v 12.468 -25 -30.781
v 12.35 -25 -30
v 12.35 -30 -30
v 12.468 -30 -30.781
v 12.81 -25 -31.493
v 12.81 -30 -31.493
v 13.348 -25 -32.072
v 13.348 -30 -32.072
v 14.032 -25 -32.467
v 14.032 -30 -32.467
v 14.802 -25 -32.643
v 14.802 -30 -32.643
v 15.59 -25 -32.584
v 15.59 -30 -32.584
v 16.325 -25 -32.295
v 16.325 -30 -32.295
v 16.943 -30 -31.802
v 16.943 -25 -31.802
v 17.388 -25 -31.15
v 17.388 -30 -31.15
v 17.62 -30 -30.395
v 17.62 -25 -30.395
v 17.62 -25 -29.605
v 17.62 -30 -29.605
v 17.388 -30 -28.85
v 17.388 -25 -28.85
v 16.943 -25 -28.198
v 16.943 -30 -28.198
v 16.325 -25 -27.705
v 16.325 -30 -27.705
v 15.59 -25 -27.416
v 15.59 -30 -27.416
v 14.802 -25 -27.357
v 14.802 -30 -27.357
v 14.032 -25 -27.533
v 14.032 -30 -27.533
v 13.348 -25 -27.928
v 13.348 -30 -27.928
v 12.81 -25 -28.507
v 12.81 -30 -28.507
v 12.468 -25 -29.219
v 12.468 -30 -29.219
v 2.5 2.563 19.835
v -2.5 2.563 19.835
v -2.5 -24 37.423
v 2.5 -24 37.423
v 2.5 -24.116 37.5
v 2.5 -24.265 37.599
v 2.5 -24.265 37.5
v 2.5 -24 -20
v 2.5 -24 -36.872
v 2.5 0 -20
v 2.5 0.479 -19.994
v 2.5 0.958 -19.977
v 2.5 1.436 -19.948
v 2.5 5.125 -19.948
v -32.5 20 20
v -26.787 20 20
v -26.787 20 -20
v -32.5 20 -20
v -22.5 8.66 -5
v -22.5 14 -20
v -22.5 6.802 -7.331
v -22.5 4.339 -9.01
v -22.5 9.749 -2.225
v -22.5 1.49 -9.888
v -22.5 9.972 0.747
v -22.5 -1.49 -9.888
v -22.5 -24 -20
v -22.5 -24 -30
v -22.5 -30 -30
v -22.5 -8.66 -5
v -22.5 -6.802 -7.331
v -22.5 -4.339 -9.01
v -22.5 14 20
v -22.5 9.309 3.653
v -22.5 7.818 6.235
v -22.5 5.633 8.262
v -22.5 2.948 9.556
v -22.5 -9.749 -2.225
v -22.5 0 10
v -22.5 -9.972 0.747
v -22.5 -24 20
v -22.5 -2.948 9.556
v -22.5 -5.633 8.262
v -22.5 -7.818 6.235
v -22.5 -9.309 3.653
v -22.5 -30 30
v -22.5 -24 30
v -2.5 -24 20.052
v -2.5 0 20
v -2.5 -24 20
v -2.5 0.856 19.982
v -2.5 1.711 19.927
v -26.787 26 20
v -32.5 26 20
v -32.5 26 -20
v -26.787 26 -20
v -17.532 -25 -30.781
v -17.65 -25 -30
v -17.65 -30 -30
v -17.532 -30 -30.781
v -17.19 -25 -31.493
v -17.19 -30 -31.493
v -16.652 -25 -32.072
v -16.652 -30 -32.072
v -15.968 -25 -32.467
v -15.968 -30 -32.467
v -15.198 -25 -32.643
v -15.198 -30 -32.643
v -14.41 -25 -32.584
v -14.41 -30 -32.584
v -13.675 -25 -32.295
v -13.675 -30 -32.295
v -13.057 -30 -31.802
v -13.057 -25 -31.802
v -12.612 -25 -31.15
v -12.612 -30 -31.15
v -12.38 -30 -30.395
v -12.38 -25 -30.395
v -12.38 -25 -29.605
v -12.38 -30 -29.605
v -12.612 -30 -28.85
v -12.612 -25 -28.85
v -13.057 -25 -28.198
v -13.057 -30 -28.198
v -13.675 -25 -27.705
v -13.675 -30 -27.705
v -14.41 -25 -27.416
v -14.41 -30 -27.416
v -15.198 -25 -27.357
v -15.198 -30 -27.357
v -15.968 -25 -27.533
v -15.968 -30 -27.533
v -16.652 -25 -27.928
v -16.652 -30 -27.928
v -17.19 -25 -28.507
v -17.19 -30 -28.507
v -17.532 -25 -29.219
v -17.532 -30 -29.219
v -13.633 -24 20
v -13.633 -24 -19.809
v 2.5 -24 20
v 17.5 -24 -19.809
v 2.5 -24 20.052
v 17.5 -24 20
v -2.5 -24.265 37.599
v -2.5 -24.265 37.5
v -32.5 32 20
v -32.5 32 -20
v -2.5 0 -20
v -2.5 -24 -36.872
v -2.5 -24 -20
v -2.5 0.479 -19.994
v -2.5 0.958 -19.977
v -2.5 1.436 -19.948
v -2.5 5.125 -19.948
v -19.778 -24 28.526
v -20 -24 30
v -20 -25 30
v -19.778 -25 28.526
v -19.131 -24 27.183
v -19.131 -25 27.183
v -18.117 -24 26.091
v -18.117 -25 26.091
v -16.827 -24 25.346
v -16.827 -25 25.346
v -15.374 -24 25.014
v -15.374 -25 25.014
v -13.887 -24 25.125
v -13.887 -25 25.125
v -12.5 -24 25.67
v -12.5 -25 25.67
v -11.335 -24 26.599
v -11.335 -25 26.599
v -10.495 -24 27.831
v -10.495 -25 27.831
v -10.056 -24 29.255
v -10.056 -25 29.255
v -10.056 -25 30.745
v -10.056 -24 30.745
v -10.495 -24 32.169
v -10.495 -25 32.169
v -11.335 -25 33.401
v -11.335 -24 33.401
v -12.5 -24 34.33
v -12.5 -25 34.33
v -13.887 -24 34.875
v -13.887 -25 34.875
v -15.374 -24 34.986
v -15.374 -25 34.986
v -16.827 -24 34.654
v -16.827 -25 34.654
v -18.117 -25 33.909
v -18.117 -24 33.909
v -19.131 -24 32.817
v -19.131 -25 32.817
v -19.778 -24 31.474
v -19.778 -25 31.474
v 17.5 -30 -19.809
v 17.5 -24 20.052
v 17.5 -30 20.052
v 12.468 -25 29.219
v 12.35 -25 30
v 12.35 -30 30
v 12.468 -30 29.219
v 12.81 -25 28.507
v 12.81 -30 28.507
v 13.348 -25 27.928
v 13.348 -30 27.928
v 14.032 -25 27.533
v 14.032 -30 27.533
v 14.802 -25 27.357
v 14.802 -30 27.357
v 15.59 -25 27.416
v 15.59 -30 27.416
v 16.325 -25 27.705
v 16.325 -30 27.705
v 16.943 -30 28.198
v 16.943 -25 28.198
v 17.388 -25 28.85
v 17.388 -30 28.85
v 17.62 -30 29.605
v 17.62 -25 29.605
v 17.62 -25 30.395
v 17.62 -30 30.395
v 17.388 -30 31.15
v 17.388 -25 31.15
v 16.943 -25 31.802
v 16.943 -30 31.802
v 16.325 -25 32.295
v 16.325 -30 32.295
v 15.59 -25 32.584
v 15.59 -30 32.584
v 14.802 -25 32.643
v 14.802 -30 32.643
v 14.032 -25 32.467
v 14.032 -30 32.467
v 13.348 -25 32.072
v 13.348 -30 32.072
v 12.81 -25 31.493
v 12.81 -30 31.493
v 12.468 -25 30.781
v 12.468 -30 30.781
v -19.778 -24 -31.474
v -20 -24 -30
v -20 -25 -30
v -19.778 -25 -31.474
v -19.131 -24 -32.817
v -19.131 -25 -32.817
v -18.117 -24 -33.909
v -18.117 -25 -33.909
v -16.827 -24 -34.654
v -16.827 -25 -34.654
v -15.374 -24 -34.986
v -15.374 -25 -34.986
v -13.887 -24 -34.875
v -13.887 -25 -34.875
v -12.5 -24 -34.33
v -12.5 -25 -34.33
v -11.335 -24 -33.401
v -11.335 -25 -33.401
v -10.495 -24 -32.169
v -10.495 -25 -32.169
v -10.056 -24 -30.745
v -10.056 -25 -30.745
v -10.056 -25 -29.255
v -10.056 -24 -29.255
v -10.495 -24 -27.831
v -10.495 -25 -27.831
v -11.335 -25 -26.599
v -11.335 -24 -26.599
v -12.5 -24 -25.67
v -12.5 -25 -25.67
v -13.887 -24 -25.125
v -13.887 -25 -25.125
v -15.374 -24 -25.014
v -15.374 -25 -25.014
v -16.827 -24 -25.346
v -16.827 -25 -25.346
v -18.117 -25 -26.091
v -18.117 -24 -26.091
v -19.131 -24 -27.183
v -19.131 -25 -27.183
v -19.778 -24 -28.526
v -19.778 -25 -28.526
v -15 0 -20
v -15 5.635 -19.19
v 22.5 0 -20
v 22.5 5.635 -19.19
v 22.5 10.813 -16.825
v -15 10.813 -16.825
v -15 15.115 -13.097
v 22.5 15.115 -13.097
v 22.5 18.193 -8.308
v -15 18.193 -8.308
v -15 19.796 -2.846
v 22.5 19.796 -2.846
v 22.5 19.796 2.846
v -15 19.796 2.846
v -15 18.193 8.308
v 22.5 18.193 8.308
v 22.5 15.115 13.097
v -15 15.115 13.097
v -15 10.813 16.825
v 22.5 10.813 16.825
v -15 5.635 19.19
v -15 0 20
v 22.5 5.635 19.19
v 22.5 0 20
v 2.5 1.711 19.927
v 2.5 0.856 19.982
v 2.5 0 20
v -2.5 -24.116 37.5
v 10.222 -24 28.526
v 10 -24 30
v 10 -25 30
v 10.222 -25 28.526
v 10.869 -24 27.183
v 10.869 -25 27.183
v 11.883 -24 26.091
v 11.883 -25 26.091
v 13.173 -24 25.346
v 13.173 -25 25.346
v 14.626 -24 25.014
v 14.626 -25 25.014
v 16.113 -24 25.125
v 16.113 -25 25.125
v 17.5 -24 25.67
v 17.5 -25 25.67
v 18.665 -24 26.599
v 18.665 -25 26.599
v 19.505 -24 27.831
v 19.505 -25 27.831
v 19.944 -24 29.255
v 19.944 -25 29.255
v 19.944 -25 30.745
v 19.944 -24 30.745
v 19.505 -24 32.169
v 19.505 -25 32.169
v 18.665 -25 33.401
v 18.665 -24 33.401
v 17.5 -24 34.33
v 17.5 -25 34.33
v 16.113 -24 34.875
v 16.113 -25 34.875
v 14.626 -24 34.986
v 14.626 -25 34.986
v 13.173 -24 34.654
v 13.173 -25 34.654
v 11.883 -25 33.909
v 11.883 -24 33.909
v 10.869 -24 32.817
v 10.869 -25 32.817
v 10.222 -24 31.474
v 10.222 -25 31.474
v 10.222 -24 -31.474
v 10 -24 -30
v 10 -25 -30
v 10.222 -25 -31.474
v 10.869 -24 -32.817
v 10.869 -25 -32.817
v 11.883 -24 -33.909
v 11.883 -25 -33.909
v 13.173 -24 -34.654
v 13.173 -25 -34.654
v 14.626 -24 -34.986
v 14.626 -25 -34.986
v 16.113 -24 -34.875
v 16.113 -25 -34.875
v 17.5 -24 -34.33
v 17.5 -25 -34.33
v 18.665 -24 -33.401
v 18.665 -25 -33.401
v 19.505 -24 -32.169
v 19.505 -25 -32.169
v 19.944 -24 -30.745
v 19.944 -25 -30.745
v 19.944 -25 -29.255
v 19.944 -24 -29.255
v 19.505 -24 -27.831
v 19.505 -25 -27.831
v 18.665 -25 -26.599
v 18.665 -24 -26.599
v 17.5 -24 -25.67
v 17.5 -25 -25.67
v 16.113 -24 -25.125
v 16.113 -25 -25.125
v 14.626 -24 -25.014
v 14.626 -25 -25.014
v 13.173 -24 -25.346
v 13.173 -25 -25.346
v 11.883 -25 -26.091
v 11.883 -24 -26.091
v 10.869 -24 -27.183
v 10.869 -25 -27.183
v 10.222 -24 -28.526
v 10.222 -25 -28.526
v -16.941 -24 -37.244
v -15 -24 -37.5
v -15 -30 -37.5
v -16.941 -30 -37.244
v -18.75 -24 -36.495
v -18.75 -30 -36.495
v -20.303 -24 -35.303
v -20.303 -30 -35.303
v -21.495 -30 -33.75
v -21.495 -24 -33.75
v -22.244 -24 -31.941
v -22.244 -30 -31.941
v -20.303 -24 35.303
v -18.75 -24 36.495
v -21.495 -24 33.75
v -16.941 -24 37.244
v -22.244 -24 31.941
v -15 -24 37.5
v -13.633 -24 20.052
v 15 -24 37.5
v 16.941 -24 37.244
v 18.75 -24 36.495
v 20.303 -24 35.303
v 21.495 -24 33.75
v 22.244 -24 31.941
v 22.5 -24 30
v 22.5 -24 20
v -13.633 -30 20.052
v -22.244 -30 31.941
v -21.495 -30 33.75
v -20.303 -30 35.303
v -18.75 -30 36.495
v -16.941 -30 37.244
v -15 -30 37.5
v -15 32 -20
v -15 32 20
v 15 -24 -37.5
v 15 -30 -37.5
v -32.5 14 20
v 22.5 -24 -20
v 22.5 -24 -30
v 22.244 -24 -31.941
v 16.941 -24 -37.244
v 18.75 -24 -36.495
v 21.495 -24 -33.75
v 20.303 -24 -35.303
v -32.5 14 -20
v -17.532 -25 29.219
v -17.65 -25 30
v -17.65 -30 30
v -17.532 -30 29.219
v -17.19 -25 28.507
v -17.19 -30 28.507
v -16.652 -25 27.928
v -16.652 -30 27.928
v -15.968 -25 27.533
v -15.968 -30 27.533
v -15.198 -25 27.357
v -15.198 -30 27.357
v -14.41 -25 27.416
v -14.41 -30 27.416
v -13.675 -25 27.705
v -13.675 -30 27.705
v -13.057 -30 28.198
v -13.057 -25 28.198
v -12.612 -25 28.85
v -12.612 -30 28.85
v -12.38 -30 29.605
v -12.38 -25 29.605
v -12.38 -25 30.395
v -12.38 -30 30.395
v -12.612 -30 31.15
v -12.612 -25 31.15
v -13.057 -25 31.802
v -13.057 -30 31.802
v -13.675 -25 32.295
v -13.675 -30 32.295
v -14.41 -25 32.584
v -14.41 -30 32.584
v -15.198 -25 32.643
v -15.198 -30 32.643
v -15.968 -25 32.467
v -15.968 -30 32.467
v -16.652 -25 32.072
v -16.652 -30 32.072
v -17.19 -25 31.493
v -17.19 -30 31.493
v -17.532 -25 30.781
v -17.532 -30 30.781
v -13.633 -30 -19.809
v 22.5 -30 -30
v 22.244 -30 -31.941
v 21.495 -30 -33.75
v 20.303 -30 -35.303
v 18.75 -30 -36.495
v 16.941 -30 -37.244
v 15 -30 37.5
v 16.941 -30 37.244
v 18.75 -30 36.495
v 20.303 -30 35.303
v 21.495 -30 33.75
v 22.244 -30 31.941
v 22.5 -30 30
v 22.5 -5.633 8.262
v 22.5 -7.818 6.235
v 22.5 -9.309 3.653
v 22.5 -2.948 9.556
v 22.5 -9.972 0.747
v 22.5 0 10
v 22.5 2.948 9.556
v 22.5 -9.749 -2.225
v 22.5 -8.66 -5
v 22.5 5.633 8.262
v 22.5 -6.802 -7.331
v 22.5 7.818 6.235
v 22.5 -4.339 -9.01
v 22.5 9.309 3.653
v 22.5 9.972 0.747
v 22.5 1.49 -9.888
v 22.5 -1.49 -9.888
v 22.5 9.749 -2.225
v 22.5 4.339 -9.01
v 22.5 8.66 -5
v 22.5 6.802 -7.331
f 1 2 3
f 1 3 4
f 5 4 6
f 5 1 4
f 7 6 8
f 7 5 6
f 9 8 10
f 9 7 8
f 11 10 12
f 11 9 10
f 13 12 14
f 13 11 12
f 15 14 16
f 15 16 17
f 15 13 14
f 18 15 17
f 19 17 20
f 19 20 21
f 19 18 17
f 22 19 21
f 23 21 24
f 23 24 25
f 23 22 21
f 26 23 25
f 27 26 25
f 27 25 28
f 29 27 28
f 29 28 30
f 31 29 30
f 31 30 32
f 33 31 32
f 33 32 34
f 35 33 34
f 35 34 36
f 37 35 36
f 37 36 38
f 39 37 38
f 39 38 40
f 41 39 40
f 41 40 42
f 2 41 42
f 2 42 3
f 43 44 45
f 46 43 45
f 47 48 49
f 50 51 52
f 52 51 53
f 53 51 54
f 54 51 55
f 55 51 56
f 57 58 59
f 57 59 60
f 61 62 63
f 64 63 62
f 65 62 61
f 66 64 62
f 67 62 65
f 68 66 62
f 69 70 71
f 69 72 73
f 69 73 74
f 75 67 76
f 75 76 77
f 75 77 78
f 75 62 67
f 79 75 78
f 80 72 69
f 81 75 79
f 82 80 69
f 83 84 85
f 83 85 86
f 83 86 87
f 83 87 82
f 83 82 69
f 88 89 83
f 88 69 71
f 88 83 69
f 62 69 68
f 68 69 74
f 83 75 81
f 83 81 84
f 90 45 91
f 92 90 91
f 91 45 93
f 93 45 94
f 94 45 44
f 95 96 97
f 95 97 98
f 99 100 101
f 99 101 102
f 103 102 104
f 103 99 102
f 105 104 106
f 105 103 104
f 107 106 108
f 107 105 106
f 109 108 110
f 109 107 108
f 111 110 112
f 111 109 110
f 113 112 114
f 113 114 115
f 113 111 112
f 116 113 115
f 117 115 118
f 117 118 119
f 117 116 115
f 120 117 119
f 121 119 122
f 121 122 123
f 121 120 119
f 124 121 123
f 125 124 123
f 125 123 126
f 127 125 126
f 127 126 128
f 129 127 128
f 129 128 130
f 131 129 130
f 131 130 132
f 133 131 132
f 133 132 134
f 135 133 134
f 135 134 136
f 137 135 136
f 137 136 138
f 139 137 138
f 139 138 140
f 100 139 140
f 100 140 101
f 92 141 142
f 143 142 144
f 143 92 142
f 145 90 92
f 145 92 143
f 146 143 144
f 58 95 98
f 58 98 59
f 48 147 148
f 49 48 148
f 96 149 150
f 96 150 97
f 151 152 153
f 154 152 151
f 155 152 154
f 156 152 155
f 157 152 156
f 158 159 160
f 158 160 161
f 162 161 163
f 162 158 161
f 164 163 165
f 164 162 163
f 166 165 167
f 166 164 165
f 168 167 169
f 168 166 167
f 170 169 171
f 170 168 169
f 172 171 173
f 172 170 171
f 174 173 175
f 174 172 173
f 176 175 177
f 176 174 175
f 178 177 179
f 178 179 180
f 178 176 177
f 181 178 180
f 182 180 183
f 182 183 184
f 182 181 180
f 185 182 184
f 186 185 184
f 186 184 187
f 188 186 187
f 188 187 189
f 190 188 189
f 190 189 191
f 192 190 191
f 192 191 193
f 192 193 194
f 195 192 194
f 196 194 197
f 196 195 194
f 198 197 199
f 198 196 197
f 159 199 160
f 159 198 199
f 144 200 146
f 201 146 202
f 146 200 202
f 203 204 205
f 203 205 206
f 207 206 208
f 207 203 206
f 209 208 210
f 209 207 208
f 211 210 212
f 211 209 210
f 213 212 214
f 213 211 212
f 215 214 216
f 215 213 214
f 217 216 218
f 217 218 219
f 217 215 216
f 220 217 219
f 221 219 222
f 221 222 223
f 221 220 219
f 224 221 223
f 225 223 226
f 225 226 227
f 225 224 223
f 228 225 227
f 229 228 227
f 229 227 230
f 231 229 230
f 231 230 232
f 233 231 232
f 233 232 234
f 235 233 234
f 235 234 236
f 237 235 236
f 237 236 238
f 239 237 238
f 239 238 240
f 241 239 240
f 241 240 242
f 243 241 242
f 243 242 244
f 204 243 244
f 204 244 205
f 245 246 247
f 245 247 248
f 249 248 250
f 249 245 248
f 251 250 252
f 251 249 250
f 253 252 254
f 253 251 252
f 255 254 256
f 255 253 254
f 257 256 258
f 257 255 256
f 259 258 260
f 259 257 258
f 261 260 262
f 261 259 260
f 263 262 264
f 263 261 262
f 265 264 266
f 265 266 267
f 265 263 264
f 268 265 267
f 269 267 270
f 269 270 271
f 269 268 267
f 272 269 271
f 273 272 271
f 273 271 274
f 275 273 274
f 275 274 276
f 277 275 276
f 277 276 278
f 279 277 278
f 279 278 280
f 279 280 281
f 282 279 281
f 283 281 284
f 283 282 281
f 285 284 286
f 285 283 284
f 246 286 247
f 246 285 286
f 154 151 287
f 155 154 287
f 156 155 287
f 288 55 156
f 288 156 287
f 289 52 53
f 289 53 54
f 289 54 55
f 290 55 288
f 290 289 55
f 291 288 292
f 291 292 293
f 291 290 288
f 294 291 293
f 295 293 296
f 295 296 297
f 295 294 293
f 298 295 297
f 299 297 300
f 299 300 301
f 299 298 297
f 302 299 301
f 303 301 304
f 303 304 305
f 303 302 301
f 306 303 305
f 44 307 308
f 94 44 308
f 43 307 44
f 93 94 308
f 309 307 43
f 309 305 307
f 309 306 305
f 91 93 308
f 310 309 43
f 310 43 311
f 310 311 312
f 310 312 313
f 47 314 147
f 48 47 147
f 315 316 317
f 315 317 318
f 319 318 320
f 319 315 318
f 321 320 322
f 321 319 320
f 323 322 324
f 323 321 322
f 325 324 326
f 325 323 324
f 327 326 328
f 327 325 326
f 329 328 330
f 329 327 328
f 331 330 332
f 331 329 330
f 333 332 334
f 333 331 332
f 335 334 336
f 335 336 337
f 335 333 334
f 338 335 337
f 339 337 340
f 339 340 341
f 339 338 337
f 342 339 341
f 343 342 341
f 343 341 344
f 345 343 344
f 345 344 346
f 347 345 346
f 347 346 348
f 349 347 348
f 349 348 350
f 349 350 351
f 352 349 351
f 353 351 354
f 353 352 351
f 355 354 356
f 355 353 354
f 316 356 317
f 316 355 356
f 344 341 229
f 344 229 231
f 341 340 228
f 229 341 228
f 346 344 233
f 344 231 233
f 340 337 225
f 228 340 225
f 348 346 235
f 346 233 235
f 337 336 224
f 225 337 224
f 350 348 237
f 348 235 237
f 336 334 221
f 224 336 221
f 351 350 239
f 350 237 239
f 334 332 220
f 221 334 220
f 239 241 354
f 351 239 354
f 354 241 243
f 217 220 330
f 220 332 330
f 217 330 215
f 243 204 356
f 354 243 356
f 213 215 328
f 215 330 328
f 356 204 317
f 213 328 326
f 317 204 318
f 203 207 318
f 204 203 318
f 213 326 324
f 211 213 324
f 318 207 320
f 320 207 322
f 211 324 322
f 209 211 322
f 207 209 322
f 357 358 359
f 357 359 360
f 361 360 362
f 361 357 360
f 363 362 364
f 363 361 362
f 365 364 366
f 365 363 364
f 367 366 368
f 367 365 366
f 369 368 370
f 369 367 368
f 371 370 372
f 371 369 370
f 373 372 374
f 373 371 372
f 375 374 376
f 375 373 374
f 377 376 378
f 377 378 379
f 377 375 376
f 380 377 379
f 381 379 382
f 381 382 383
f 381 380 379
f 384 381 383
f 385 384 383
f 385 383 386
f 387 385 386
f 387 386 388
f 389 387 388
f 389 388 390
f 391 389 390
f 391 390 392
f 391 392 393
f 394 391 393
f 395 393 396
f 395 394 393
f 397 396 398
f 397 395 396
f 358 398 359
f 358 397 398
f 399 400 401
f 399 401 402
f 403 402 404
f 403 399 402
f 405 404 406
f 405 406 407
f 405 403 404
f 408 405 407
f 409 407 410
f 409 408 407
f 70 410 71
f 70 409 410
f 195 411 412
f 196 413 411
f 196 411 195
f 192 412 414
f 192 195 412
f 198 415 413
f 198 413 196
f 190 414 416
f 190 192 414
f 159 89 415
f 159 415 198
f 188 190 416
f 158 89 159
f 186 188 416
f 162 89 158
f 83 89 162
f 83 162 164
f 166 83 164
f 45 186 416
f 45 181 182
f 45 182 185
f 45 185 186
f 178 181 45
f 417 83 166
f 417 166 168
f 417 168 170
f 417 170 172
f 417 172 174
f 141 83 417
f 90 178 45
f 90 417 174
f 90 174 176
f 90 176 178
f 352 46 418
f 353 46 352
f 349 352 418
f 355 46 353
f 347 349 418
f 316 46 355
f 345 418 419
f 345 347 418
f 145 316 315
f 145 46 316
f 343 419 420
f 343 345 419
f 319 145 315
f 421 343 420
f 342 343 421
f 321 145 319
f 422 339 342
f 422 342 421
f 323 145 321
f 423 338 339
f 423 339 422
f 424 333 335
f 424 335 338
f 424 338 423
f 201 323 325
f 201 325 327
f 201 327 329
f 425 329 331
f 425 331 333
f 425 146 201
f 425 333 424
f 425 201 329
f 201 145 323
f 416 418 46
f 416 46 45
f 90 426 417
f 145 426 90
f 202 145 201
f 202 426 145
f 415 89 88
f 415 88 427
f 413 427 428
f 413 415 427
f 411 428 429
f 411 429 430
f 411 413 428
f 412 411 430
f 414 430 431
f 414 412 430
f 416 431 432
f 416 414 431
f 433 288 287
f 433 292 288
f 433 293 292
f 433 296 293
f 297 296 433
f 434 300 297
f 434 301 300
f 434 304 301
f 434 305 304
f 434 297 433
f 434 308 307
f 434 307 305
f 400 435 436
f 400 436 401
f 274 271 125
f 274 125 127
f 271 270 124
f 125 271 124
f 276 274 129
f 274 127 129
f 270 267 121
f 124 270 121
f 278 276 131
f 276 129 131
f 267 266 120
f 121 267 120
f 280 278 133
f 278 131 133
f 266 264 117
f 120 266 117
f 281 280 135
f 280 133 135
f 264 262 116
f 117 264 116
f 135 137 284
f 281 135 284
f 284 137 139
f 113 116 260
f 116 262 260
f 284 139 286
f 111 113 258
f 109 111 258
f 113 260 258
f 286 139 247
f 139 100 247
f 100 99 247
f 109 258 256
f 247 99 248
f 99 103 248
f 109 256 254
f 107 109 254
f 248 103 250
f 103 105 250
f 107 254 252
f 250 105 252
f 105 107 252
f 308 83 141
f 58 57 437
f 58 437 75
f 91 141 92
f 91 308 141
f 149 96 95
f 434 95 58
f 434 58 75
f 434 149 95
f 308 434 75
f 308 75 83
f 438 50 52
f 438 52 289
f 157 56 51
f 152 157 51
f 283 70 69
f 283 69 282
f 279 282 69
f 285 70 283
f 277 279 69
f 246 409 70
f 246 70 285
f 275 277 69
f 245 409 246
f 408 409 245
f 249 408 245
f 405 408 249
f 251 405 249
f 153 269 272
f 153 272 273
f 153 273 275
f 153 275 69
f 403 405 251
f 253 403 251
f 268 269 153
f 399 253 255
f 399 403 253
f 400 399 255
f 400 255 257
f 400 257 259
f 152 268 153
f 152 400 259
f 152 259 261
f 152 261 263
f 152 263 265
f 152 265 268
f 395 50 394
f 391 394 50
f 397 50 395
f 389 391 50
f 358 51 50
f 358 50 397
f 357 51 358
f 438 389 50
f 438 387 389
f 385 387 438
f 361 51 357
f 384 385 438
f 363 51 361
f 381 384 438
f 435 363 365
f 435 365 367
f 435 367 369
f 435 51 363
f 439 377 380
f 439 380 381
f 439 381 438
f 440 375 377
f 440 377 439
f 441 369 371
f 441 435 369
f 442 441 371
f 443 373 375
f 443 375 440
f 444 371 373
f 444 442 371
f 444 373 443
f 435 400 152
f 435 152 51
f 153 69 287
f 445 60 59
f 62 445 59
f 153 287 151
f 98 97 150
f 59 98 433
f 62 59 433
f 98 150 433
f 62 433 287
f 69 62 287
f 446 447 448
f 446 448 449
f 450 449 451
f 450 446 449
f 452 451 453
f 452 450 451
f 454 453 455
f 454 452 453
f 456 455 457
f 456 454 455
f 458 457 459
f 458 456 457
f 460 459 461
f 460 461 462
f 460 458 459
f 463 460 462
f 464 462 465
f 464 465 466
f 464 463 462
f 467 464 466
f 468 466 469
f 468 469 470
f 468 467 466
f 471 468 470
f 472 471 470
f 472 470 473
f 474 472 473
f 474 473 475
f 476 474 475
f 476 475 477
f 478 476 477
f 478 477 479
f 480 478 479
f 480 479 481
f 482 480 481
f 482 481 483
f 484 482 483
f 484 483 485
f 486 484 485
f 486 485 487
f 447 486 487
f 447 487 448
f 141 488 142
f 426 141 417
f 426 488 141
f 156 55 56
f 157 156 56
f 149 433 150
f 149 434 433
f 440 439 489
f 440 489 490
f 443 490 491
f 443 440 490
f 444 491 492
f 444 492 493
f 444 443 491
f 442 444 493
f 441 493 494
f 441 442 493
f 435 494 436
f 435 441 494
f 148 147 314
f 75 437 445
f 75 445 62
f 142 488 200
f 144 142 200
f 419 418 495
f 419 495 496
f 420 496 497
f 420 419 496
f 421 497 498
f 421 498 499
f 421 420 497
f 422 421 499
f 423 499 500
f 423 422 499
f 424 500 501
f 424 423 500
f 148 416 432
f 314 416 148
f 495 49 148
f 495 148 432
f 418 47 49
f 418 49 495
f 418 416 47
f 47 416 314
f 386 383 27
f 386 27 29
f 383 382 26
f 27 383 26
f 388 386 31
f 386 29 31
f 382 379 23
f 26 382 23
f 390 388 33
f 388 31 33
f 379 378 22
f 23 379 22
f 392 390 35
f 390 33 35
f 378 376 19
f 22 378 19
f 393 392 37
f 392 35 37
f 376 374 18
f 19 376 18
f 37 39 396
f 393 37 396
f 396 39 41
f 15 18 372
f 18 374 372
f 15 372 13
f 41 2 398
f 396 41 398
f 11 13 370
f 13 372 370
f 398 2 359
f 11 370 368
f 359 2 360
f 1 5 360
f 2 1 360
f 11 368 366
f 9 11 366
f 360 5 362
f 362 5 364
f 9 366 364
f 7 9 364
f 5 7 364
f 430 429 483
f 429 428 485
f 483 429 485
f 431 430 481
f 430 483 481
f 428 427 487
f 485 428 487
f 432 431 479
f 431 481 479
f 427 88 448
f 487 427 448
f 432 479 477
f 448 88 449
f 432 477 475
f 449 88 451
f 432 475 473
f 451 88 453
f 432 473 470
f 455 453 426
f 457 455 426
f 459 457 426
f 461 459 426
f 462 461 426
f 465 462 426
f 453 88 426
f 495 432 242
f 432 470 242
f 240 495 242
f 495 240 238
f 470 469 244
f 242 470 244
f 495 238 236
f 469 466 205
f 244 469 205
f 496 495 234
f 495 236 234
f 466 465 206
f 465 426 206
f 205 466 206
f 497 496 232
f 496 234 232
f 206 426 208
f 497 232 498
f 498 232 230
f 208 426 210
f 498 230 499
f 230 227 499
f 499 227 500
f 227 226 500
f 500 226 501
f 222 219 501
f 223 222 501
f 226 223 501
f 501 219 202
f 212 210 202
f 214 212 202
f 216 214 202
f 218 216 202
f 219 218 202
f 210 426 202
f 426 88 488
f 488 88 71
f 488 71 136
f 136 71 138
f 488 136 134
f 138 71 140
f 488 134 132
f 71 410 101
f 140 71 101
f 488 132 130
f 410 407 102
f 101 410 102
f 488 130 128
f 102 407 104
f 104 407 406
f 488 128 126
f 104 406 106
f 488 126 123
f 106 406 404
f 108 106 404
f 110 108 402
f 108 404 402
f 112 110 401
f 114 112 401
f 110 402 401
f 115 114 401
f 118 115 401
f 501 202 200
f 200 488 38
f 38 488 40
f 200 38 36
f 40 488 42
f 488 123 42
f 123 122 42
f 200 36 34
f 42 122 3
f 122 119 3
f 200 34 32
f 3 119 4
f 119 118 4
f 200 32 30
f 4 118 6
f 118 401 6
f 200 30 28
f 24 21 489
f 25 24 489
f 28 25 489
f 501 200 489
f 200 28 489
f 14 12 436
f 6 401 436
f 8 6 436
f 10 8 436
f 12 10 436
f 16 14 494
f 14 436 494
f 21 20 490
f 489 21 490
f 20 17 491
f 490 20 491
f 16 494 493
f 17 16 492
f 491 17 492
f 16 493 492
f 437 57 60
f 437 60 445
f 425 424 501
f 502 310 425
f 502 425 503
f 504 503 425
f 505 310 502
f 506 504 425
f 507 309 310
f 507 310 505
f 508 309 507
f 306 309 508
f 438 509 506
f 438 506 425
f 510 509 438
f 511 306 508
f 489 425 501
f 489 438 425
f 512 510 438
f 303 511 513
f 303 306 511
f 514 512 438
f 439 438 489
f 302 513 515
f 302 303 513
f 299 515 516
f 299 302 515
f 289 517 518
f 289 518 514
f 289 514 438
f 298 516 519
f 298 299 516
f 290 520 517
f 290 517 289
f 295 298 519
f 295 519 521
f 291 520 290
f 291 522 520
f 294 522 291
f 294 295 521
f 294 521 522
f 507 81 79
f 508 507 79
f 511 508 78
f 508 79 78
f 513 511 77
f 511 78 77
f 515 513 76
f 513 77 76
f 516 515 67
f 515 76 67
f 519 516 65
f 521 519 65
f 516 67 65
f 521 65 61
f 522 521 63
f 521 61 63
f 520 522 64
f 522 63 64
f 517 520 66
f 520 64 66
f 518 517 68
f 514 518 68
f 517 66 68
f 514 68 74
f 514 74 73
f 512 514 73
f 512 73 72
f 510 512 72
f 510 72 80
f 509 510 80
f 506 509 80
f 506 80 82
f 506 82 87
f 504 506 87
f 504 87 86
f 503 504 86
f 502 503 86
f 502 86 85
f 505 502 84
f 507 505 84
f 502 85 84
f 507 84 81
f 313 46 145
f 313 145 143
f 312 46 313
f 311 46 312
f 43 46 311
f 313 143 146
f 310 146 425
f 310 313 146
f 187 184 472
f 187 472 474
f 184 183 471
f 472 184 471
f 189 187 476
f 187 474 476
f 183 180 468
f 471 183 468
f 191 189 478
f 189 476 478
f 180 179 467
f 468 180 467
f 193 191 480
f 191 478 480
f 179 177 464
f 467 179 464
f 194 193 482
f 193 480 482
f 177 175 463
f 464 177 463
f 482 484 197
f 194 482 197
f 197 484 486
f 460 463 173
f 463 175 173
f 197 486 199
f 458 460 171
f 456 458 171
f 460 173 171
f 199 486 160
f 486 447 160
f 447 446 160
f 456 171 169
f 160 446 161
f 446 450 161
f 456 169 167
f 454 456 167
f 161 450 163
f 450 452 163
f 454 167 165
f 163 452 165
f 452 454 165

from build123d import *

# Parameters (mm, degrees)
CROQUIS1_R              = 10
SALIENTE_EXTRUIR1_DEPTH = 22.5
CROQUIS3_R              = 2.65
SALIENTE_EXTRUIR2_DEPTH = 6
CROQUIS5_R              = 5
CORTAR_EXTRUIR1_DEPTH   = 1
SALIENTE_EXTRUIR3_DEPTH = 20
CROQUIS8_R              = 10
CORTAR_EXTRUIR2_DEPTH   = 45
SALIENTE_EXTRUIR4_DEPTH = 2.5
CROQUIS15_W             = 31.132875884
CROQUIS15_H             = 39.860662673
CORTAR_EXTRUIR3_DEPTH   = 6


with BuildPart() as part:
    # Croquis1 → Saliente-Extruir1 (new body, symmetric)
    with BuildSketch(Plane(origin=(0, 0, 0), x_dir=(0, 0, -1), z_dir=(1, 0, 0))):
        with BuildLine():
            Line((-20, -24), (20, -24))
            Line((20, -24), (20, 0))
            ThreePointArc((20, 0), (0, 20), (-20, 0))
            Line((-20, 0), (-20, -24))
        make_face()
        Circle(CROQUIS1_R, mode=Mode.SUBTRACT)
    extrude(amount=SALIENTE_EXTRUIR1_DEPTH, both=True)

    # Croquis3 → Saliente-Extruir2 (add)
    with BuildSketch(Plane(origin=(0, -24, 0), x_dir=(-1, 0, 0), z_dir=(0, -1, 0))):
        with BuildLine():
            Line((22.5, 30), (22.5, 18.749800444))
            Line((22.5, 18.749800444), (22.5, -30))
            ThreePointArc((22.5, -30), (20.303300859, -35.303300859), (15, -37.5))
            Line((15, -37.5), (-15, -37.5))
            ThreePointArc((-15, -37.5), (-20.303300859, -35.303300859), (-22.5, -30))
            Line((-22.5, -30), (-22.5, 30))
            ThreePointArc((-22.5, 30), (-20.303300859, 35.303300859), (-15, 37.5))
            Line((-15, 37.5), (15, 37.5))
            ThreePointArc((15, 37.5), (20.303300859, 35.303300859), (22.5, 30))
        make_face()
        with Locations((15, 30)):
            Circle(CROQUIS3_R, mode=Mode.SUBTRACT)
        with Locations((-15, 30)):
            Circle(CROQUIS3_R, mode=Mode.SUBTRACT)
        with Locations((15, -30)):
            Circle(CROQUIS3_R, mode=Mode.SUBTRACT)
        with Locations((-15, -30)):
            Circle(CROQUIS3_R, mode=Mode.SUBTRACT)
    extrude(amount=SALIENTE_EXTRUIR2_DEPTH)

    # Croquis5 → Cortar-Extruir1 (cut)
    with BuildSketch(Plane(origin=(0, -24, 0), x_dir=(-1, 0, 0), z_dir=(0, -1, 0))):
        with Locations((15, 30)):
            Circle(CROQUIS5_R)
        with Locations((-15, 30)):
            Circle(CROQUIS5_R)
        with Locations((15, -30)):
            Circle(CROQUIS5_R)
        with Locations((-15, -30)):
            Circle(CROQUIS5_R)
    extrude(amount=CORTAR_EXTRUIR1_DEPTH, mode=Mode.SUBTRACT)

    # Croquis6 → Saliente-Extruir3 (add, symmetric)
    with BuildSketch(Plane.XY):
        Polygon((-15, 20.067860351), (-15, 32), (-32.5, 32), (-32.5, 26), (-26.787274513, 26), (-26.787274513, 20), (-32.5, 20), (-32.5, 14), (-22.5, 14), (-22.5, 0), (-15, 0), align=None)
    extrude(amount=SALIENTE_EXTRUIR3_DEPTH, both=True)

    # Croquis8 → Cortar-Extruir2 (cut)
    with BuildSketch(Plane.ZY.offset(22.5)):
        Circle(CROQUIS8_R)
    extrude(amount=-CORTAR_EXTRUIR2_DEPTH, mode=Mode.SUBTRACT)

    # Croquis10 → Saliente-Extruir4 (add, symmetric)
    with BuildSketch(Plane(origin=(0, 0, 0), x_dir=(0, 0, -1), z_dir=(1, 0, 0))):
        Polygon((-18.138791867, 5.125023494), (-37.598536218, -24.265305437), (-18.138791867, -24.265305437), align=None)
        Polygon((37.025889105, -24.265305437), (19.948399075, -24.265305437), (19.948399075, 5.125023494), align=None)
    extrude(amount=SALIENTE_EXTRUIR4_DEPTH, both=True)

    # Croquis15 → Cortar-Extruir3 (cut)
    with BuildSketch(Plane.XZ.offset(30)):
        with Locations((1.933562058, 0.121457578)):
            Rectangle(CROQUIS15_W, CROQUIS15_H)
    extrude(amount=-CORTAR_EXTRUIR3_DEPTH, mode=Mode.SUBTRACT)


solid = part.part
